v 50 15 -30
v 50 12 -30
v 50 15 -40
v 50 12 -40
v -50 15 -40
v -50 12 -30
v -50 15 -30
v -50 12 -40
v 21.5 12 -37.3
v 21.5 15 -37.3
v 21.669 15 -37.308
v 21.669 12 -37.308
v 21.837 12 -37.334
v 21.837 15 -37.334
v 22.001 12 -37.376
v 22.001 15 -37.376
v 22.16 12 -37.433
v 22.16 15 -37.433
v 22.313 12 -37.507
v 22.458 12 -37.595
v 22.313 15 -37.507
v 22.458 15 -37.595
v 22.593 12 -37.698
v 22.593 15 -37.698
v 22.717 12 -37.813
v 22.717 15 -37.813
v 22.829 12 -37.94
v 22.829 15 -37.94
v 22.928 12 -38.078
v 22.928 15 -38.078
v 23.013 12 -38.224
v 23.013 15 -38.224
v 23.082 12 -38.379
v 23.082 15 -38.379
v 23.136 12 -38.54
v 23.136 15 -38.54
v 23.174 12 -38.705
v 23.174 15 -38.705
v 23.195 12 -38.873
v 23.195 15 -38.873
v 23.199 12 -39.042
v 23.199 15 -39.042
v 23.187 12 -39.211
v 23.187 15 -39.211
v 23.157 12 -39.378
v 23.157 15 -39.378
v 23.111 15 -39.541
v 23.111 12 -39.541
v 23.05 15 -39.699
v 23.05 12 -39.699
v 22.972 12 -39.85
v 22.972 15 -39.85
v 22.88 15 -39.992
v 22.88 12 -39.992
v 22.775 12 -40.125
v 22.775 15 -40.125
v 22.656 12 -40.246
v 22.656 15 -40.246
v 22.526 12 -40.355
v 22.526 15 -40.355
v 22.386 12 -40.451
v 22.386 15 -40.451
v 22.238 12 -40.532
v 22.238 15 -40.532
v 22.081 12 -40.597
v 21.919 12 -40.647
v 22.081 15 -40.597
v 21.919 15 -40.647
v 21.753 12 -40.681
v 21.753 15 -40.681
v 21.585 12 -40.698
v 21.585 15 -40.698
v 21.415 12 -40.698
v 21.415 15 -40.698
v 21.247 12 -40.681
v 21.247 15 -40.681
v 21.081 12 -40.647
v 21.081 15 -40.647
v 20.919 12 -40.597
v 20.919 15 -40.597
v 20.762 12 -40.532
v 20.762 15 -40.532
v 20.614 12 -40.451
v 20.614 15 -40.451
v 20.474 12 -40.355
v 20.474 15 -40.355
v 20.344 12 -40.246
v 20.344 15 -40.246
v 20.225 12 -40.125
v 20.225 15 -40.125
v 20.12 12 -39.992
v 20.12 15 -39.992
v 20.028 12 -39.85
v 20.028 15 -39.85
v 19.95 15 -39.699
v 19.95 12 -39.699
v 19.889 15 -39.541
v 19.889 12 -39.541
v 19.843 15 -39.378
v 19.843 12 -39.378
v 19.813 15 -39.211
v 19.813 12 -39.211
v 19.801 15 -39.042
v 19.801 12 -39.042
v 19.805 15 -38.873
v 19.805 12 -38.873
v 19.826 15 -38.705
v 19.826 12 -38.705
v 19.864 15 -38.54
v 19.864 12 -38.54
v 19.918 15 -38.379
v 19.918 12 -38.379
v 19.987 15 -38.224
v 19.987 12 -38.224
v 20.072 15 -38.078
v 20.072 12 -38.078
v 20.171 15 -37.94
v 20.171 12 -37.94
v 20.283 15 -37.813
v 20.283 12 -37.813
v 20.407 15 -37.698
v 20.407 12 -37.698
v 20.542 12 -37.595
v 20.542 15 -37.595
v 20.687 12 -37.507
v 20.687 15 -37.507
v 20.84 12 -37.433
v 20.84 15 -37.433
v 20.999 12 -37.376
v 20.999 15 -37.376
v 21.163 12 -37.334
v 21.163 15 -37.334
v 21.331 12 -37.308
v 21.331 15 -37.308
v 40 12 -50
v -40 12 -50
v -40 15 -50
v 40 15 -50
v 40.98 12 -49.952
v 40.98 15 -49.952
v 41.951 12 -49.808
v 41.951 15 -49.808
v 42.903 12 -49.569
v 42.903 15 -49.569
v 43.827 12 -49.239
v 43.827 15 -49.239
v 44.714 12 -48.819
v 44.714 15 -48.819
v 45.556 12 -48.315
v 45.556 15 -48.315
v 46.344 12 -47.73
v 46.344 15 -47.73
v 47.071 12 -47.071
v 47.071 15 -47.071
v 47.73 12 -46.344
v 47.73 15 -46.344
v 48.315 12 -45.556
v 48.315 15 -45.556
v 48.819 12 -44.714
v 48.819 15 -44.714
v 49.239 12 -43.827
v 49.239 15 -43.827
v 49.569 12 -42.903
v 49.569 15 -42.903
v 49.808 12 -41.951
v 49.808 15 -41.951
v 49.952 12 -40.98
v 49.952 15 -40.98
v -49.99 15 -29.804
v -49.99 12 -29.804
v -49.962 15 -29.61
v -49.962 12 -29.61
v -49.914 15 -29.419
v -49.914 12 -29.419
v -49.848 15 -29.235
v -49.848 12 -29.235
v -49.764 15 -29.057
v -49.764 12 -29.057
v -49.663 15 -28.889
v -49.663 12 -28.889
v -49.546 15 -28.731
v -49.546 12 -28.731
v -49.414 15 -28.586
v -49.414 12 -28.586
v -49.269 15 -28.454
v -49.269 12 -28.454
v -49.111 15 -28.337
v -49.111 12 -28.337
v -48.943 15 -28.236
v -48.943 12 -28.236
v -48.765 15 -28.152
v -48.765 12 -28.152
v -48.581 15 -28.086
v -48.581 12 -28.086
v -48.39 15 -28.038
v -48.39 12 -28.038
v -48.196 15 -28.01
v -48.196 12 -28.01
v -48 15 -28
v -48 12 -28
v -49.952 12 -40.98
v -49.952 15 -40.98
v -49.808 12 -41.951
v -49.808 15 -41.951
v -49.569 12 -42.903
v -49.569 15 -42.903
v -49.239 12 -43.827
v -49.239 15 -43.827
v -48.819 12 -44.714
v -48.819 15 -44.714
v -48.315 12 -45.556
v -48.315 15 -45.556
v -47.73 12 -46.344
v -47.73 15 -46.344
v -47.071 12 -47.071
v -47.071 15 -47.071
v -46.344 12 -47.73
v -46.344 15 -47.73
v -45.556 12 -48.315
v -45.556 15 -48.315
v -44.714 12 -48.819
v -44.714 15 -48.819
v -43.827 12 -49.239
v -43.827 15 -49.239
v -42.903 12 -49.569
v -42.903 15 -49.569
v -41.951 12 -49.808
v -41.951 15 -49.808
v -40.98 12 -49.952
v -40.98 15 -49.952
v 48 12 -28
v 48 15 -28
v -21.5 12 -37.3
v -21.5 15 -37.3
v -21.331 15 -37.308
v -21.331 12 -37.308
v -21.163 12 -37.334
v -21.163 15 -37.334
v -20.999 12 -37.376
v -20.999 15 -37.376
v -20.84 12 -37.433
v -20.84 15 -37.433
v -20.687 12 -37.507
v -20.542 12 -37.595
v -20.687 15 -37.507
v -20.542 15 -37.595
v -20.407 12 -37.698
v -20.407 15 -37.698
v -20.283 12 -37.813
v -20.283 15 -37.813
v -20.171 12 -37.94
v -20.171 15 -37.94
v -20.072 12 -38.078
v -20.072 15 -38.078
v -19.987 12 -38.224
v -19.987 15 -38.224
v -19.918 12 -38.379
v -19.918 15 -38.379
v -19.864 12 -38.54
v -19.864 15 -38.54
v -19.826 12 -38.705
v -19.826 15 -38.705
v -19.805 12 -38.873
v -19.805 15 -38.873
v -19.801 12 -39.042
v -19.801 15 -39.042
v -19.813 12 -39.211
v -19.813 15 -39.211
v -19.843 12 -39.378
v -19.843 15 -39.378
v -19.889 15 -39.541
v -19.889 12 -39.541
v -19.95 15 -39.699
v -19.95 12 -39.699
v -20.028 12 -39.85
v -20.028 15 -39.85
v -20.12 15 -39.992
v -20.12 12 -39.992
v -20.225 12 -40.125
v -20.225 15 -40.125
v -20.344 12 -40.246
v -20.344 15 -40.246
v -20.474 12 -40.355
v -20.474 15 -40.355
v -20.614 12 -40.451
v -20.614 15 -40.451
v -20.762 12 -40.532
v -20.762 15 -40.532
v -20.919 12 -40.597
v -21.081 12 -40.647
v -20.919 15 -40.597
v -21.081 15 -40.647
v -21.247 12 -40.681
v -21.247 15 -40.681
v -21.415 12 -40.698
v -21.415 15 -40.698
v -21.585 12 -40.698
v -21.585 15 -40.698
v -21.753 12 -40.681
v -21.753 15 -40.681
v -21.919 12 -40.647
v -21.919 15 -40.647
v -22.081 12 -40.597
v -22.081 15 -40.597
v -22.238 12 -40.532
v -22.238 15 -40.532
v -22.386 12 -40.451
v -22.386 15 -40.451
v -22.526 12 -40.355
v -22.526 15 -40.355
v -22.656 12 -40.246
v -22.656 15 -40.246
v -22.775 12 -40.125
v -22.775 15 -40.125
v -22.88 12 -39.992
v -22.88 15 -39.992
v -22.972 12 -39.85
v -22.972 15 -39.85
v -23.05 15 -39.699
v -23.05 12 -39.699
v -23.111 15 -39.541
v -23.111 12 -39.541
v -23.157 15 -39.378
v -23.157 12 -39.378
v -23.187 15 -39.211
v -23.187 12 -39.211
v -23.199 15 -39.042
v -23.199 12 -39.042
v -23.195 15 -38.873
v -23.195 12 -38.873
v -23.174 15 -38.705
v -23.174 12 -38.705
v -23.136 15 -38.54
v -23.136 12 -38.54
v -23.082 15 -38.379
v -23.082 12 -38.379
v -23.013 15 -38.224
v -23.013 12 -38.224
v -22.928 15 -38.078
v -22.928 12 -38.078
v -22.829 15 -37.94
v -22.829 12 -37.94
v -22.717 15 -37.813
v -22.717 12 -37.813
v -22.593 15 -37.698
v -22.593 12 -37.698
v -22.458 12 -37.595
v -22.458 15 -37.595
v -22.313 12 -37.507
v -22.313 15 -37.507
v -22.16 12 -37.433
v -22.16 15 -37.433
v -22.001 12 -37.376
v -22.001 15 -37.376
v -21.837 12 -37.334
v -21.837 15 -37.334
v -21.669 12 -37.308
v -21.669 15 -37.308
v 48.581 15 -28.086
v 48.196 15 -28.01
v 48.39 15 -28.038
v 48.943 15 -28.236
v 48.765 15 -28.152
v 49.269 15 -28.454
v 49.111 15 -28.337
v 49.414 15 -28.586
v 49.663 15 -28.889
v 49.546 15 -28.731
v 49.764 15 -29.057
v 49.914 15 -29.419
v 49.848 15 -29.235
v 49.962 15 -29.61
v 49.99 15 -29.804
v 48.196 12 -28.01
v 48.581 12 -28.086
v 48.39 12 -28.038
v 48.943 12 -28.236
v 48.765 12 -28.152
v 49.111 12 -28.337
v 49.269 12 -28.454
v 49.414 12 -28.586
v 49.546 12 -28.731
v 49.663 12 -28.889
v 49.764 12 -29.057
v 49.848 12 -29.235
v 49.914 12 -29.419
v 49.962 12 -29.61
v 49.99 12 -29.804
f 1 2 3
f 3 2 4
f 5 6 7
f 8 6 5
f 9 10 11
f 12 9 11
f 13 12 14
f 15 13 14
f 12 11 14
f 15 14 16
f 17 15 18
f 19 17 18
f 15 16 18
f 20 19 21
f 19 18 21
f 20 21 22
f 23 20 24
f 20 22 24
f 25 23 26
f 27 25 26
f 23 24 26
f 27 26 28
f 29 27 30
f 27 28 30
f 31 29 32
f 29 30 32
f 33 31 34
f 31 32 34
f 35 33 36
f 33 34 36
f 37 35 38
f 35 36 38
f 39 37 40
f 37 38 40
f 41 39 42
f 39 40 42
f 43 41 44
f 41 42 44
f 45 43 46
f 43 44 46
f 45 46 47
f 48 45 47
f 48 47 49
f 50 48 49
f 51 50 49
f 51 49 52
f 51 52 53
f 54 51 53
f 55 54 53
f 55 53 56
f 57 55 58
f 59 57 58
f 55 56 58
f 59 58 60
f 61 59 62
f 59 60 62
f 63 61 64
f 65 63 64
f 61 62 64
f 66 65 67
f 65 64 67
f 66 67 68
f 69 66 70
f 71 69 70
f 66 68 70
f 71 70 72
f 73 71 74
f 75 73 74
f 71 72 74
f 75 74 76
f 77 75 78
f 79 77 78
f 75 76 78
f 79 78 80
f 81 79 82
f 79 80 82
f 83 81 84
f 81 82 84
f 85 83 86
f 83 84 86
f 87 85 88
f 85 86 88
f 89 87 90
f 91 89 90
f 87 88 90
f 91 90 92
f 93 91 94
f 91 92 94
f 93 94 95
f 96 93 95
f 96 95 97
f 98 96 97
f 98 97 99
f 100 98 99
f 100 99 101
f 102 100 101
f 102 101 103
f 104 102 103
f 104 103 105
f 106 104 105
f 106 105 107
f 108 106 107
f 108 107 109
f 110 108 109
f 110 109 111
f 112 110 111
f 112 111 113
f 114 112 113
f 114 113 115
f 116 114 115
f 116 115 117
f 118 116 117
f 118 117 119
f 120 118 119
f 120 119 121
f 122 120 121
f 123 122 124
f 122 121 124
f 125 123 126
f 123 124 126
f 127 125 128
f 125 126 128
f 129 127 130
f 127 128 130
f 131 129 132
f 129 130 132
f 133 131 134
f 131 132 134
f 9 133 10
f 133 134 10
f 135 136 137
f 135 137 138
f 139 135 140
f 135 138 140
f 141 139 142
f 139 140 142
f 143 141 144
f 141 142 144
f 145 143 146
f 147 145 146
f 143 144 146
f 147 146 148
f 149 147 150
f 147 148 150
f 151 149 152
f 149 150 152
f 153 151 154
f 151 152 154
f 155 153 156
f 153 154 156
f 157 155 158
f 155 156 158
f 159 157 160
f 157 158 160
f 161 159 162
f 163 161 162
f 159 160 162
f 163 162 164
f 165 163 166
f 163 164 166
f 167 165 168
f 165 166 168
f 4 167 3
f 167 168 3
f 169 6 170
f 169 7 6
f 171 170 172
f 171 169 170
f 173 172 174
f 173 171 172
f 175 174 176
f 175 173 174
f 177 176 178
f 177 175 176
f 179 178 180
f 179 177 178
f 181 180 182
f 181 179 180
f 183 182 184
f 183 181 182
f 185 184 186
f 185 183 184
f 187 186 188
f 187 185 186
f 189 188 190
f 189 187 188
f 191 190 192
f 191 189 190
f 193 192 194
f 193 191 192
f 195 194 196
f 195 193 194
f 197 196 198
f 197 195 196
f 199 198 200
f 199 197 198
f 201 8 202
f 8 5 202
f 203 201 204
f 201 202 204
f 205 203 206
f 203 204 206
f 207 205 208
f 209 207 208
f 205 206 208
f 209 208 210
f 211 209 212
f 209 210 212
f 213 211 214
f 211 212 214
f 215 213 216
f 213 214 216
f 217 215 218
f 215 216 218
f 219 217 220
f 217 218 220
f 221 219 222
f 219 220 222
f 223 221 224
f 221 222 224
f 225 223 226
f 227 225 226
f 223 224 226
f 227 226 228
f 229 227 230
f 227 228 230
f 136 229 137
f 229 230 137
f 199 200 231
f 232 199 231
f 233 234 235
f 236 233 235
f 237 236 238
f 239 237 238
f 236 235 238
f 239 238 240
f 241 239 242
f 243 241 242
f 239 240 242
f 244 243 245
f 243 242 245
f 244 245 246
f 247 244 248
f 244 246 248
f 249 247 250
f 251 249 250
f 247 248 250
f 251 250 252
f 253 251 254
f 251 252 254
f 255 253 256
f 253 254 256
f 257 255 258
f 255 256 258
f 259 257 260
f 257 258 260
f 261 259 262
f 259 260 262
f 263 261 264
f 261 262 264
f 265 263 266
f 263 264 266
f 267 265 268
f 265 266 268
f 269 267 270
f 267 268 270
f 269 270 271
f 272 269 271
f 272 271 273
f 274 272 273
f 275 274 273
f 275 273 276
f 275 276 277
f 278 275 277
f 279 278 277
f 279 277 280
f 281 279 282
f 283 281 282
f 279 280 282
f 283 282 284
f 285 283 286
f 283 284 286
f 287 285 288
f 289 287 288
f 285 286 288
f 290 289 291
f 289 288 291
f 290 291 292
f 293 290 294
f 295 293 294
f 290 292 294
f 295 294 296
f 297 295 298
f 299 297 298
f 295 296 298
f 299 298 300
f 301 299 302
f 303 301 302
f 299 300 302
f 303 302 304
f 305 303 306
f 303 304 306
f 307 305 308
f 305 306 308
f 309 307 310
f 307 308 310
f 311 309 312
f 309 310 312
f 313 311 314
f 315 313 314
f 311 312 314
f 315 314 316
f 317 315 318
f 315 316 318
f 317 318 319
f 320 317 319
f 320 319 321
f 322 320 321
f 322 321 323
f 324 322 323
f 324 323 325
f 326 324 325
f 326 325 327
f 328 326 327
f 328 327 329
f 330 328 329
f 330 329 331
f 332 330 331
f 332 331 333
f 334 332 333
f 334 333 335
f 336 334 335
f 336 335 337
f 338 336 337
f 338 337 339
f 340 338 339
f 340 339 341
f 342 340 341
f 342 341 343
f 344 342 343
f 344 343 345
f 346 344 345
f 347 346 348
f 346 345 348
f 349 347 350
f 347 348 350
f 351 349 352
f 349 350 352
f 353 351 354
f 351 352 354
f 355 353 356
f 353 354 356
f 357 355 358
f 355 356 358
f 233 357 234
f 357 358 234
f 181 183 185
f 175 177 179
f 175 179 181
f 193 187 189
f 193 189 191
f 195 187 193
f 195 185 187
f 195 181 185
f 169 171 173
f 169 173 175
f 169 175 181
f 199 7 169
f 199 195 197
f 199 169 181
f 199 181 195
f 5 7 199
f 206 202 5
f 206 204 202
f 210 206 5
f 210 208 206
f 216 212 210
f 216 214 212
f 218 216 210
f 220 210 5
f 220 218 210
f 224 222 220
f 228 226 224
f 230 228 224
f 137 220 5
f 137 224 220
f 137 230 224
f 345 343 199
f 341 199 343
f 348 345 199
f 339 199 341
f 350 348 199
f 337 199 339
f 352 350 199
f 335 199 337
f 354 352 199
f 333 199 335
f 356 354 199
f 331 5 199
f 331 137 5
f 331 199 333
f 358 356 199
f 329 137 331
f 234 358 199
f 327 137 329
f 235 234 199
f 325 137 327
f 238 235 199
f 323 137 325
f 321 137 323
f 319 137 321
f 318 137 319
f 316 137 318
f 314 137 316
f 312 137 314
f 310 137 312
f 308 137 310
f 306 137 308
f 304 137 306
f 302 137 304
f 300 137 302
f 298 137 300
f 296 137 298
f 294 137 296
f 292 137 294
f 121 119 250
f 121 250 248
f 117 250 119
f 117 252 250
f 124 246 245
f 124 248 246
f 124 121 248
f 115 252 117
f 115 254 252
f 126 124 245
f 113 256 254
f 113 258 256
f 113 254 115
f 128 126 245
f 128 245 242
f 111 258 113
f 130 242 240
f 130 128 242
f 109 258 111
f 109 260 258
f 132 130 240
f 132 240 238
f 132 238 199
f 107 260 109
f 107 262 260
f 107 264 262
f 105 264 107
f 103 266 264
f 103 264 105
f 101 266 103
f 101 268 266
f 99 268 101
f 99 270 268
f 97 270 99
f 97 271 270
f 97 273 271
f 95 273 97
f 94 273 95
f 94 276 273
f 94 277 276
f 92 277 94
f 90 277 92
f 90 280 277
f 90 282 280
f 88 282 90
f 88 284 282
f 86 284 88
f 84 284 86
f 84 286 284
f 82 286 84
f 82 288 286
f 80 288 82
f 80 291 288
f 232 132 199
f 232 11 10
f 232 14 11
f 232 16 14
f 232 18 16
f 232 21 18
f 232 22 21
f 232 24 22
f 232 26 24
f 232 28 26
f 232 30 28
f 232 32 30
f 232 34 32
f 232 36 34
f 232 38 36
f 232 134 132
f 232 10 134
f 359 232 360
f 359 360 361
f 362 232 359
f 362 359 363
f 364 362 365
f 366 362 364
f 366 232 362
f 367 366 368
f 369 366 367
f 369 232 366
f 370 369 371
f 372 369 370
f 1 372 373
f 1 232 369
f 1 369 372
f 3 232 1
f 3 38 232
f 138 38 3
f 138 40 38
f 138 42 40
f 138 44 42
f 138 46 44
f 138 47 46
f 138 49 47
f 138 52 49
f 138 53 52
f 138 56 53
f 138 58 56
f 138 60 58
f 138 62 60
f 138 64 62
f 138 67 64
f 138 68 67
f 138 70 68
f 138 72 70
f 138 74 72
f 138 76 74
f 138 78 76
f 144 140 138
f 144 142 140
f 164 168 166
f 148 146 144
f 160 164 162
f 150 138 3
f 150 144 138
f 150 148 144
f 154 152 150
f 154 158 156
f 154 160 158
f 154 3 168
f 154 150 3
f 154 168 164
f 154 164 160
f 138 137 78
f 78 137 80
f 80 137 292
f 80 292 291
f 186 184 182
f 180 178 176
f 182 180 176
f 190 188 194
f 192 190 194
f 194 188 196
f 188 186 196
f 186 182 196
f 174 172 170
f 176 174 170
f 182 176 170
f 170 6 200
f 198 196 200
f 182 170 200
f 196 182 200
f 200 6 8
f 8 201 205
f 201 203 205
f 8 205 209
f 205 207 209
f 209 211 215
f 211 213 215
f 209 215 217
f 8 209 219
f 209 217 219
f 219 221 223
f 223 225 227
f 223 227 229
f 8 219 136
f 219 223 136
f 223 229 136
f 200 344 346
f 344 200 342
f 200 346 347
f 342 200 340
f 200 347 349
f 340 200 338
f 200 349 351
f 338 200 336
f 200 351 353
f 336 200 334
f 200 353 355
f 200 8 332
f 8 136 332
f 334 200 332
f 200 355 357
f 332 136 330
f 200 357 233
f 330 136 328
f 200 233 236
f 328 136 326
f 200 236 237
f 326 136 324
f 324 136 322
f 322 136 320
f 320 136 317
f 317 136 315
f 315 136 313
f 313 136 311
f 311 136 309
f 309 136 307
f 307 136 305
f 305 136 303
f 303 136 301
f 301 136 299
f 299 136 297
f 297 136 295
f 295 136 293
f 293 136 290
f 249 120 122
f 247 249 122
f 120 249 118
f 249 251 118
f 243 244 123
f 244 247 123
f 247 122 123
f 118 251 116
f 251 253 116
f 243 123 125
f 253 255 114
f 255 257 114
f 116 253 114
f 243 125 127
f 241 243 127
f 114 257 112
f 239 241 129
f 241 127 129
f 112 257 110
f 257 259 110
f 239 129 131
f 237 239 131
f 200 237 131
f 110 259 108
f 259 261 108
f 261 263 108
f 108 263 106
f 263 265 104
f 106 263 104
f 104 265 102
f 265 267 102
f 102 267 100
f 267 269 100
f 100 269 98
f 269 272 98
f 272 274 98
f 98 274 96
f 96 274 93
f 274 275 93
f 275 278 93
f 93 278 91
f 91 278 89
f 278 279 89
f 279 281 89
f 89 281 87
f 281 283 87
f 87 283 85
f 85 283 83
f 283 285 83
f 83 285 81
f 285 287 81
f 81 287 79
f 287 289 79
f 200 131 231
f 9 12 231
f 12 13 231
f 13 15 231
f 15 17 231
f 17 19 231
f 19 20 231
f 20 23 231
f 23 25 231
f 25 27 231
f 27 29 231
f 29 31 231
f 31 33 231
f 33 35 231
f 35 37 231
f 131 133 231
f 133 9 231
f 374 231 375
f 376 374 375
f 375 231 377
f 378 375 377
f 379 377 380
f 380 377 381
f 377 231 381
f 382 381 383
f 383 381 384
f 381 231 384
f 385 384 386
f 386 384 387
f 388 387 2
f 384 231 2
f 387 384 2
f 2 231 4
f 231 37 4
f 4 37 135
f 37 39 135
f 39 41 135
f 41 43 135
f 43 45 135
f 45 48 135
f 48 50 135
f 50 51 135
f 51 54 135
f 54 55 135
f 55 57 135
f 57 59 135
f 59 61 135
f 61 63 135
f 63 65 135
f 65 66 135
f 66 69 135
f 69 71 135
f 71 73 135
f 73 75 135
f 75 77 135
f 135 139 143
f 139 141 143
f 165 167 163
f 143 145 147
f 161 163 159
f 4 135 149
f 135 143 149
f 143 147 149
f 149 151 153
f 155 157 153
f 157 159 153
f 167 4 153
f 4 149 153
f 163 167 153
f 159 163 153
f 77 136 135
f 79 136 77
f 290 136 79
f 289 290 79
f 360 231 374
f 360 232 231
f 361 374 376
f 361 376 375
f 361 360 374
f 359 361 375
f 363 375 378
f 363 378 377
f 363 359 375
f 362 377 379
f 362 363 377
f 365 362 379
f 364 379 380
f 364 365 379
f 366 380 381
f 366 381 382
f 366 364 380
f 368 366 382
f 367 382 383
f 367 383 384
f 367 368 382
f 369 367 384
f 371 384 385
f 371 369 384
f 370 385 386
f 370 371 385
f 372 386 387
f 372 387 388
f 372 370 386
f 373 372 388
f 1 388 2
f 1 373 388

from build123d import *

# Parameters (mm, degrees)
SKETCH1_W           = 100
SKETCH1_H           = 22
BOSS_EXTRUDE1_DEPTH = 3
SKETCH2_R           = 1.7
CUT_EXTRUDE1_DEPTH  = 3
FILLET1_R           = 10
FILLET2_R           = 2


with BuildPart() as part:
    # Sketch1 → Boss-Extrude1 (new body)
    with BuildSketch(Plane(origin=(0, 12, 0), x_dir=(1, 0, 0), z_dir=(0, 1, 0))):
        with Locations((0, 39)):
            Rectangle(SKETCH1_W, SKETCH1_H)
    extrude(amount=BOSS_EXTRUDE1_DEPTH)

    # Sketch2 → Cut-Extrude1 (cut)
    with BuildSketch(Plane(origin=(0, 15, 0), x_dir=(1, 0, 0), z_dir=(0, 1, 0))):
        with Locations(Location((-21.5, 39, 0), (0, 0, 270))):
            Circle(SKETCH2_R)
        with Locations(Location((21.5, 39, 0), (0, 0, 270))):
            Circle(SKETCH2_R)
    extrude(amount=-CUT_EXTRUDE1_DEPTH, mode=Mode.SUBTRACT)

    # Fillet1
    fillet1_edges = [part.edges().sort_by_distance(p)[0] for p in [
        (-50, 13.5, -50),
        (50, 13.5, -50),
    ]]
    fillet(fillet1_edges, radius=FILLET1_R)

    # Fillet2
    fillet2_edges = [part.edges().sort_by_distance(p)[0] for p in [
        (50, 13.5, -28),
        (-50, 13.5, -28),
    ]]
    fillet(fillet2_edges, radius=FILLET2_R)


solid = part.part
